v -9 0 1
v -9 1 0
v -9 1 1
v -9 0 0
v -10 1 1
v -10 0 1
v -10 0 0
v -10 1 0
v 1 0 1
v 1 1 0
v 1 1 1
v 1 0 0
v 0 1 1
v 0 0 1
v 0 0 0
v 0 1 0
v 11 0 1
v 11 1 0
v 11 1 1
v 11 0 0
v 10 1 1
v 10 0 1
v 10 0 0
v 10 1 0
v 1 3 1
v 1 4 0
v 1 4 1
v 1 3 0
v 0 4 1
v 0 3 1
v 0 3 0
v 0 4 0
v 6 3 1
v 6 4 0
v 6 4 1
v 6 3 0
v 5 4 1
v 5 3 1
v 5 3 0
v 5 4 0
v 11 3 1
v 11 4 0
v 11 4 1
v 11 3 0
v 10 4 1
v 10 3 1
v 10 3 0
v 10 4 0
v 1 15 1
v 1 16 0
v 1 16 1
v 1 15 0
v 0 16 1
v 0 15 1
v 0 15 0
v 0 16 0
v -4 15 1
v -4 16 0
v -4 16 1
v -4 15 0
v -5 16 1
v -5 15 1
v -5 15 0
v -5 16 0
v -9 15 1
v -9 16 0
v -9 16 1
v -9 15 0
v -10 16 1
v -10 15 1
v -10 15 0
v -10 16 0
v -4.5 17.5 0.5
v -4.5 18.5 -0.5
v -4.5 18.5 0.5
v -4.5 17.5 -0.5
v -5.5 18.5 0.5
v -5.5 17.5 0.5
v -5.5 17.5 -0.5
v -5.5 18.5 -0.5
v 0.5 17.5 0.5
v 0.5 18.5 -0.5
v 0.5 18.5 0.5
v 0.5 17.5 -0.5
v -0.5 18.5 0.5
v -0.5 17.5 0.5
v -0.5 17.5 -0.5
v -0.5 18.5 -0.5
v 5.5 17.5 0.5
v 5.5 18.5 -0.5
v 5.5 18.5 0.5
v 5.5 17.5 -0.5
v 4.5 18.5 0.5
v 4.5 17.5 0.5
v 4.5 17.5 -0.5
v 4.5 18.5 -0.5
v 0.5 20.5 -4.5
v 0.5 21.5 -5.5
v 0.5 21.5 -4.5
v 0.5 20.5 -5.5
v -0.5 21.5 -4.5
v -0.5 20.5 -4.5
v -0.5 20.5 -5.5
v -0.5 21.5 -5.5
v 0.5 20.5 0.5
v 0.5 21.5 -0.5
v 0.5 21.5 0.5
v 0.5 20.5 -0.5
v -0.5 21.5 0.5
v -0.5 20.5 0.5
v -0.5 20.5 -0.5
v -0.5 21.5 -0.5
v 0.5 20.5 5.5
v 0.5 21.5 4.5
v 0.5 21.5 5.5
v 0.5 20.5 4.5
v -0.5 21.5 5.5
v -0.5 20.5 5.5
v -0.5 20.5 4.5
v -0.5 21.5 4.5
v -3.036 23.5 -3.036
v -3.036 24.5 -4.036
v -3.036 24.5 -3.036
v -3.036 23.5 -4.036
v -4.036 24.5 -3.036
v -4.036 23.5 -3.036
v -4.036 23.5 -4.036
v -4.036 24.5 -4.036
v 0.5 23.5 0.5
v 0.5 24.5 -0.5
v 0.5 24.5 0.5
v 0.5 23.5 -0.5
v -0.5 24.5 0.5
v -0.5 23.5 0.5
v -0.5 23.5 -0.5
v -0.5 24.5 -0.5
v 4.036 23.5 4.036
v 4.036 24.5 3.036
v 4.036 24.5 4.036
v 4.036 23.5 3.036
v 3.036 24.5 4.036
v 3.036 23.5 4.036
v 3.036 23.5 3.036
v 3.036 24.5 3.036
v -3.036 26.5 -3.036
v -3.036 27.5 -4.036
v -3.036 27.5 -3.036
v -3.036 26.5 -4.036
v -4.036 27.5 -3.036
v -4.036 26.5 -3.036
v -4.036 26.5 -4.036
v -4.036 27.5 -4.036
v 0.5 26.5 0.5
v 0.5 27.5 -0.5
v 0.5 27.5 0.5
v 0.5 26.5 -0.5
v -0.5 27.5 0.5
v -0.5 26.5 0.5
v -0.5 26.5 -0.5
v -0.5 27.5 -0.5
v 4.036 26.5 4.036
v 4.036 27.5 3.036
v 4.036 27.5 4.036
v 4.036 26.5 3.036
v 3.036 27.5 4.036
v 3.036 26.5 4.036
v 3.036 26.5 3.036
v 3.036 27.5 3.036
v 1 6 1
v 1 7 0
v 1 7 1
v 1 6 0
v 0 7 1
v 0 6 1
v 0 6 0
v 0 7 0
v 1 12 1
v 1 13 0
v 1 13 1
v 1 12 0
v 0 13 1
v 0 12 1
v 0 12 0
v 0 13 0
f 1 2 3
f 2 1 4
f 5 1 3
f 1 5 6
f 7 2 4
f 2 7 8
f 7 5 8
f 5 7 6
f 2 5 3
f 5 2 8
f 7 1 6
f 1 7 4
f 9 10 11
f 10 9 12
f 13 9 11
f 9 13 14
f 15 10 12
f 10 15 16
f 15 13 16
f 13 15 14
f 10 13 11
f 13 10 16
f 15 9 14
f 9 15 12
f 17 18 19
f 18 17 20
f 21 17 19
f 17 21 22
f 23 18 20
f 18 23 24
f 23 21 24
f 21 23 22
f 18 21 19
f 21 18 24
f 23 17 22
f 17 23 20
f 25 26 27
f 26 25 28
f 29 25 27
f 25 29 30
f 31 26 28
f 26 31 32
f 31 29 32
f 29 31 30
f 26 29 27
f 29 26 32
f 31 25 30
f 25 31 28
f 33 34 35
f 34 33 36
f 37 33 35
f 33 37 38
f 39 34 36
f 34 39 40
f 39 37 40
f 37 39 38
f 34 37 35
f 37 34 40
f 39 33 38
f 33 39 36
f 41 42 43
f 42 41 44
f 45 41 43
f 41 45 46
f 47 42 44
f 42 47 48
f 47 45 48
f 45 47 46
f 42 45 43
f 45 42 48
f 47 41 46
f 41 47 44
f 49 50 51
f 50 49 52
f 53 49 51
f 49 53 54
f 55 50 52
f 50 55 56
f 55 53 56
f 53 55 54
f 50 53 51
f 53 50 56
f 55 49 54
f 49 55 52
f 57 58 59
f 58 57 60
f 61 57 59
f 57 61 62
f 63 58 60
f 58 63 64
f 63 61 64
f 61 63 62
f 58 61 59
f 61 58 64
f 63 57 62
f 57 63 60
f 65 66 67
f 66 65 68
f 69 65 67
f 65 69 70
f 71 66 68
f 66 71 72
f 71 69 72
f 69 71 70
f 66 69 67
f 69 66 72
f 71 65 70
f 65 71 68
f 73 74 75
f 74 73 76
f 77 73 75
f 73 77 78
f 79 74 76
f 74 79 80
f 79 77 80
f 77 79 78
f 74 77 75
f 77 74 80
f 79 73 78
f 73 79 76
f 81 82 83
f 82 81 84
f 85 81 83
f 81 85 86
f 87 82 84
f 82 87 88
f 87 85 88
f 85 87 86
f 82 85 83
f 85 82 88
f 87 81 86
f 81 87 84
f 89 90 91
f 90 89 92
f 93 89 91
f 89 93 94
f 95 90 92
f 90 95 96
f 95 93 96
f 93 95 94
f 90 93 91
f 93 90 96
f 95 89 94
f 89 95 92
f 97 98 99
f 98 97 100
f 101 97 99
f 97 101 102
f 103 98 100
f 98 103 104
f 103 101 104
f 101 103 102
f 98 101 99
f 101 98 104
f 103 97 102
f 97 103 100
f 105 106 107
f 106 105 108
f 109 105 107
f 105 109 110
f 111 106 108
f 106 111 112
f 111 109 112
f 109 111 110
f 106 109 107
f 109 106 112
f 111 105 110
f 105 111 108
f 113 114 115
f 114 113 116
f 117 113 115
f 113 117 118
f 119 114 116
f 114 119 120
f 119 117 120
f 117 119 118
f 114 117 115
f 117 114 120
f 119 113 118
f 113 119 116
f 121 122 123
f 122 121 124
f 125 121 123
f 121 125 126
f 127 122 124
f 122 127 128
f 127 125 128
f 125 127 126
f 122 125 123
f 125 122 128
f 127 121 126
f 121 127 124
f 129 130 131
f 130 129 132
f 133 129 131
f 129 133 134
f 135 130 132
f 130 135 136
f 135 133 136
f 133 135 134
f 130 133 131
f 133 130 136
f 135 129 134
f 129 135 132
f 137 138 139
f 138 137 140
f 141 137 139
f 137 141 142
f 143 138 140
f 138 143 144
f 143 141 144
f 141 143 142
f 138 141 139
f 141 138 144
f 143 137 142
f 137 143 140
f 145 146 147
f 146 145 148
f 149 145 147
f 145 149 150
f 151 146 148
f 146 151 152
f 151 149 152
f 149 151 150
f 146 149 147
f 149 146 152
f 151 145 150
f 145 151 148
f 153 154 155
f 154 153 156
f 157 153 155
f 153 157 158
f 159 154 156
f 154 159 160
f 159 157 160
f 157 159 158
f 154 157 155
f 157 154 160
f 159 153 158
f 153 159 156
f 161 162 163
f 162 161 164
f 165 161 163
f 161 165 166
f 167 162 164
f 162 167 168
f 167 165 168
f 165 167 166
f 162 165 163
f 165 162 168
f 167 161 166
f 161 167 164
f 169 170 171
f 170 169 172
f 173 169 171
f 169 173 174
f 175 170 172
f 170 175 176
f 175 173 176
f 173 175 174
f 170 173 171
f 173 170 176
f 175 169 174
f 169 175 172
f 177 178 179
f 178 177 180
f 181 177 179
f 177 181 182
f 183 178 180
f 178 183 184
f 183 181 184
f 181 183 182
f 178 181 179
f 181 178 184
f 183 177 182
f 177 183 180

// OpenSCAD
// file: unit_vectors.scad
// Define standard vector directions
// i, j, k
i = [1,0,0];
j = [0,1,0];
k = [0,0,1];
// zero vector
O = [0,0,0];
// file: extended_tests.scad
// Openscad extended test functions and modules
// Copyright (C) 2020  rjhwelsh

// This library is free software; you can redistribute it and/or
// modify it under the terms of the GNU Lesser General Public
// License as published by the Free Software Foundation; either
// version 2.1 of the License, or (at your option) any later version.
//
// This library is distributed in the hope that it will be useful,
// but WITHOUT ANY WARRANTY; without even the implied warranty of
// MERCHANTABILITY or FITNESS FOR A PARTICULAR PURPOSE.  See the GNU
// Lesser General Public License for more details.
//
// You should have received a copy of the GNU Lesser General Public
// License along with this library; if not, write to the Free Software
// Foundation, Inc., 51 Franklin Street, Fifth Floor, Boston, MA  02110-1301  USA

// assert_equal; Test first and second are equal
module assert_equal(first, second, msg) {
     msg = msg ? msg : str(first, " is not equal to ", second);
     assert(first==second, msg);
}
// file: extended_shapes.scad
// Openscad extended shapes
// Copyright (C) 2020  rjhwelsh

// This library is free software; you can redistribute it and/or
// modify it under the terms of the GNU Lesser General Public
// License as published by the Free Software Foundation; either
// version 2.1 of the License, or (at your option) any later version.
//
// This library is distributed in the hope that it will be useful,
// but WITHOUT ANY WARRANTY; without even the implied warranty of
// MERCHANTABILITY or FITNESS FOR A PARTICULAR PURPOSE.  See the GNU
// Lesser General Public License for more details.
//
// You should have received a copy of the GNU Lesser General Public
// License along with this library; if not, write to the Free Software
// Foundation, Inc., 51 Franklin Street, Fifth Floor, Boston, MA  02110-1301  USA

include <unit_vectors.scad>;

module array(
     L=false,              // total Length between centers
     n=3,               // number of items
     dx=false,          // distance between centres
     center=true,       // center array
     v=i                // unit vector direction
     )
     let( v=v/norm(v)) // convert to unit vector
{
     msg1="Please specify a single option of \"L\" or \"dx\"!";
     if(L) assert(!dx, msg1);
     if(dx) assert(!L, msg1);

     if (n>1) {
	  let(
	       dx=(L ? L/(n-1) : dx),
	       L=(dx ? dx*(n-1) : L)
	       )
	       for(x=[1:n])
		    translate(center ? -L/2*v : O) // Centre in axis
			 translate(dx*(x-1)*v)
			 children();
     }
     else if(n==1||n==-1) {
	  children();
     }
     else if(n<-1) {
	  let(n=-n) // positive the negative n
	       let(dx=(L ? L/(n-1) : dx),
		   L=(dx ? dx*(n-1) : L))
	       for(x=[1:n])
		    translate(center ? L/2*v : O) // Centre in axis
			 translate(-dx*(x-1)*v)
			 children();
     }
}

module fillet_cube(size=[1,1,1], r=0.3, center=false) {
     // rounds cornes in xy dimension only
     // size = outer dimensions of cube
     // r = fillet radius
     let( r_max = min(size[0], size[1])/2)
	  assert(r <= r_max, str("Radius does not fit within size! r_max=", r_max));
     recenter=(center ? 0 : 0.5);
     translate(recenter*[size[0],size[1],0])
	  hull()
	  let ( m = [size[0]/2 - r, size[1]/2 - r, 0] ) {
	  for(i = [-1:2:1])
	       for(j = [-1:2:1])
		    translate([i*m[0], j*m[1], m[2]])
			 cylinder(h=size[2],r=r,$fn=$fn);
     }
}

module fillet_trapezoid(size=i+j+k, r=0.3, angle=45, center=true) {
     // size = [xyz] outer dimensions to fit trapezoid in
     // r = fillet radius
     // angle = angle between base and sides
     // center = true/false; whether to position in center (or not)

     module tri(b, h) {
	  translate(h*j) children();
	  translate(b*i) children();
	  //children();
     }

     let( r_max = min(size[0], size[1])/2)
	  assert(r <= r_max, str("Radius does not fit within size! r_max=", r_max));
     let (s_r = [size[0]/2 - r, size[1]/2 - r, 0],
	  dx_max = s_r[0],
	  dh_max = dx_max*tan(angle),
	  dh = 2*s_r[1],
	  dx = dh/tan(angle),
	  assert_message = str(
	       "fillet_trapezoid: Reduce height. Maximum height (size[1]) is ", dh_max + 2*r, "!"),
	  // tr_x = max(size[0], size[0]-2*dx) // Translation for non-central placement
	  tr_x = size[0] // Translates according to width of base, (size[0])
	  ) {
	  //echo(str([dx, dx_max],[dh, dh_max]));
	  assert(dx <= dx_max, assert_message);
	  offset_center=(center ? 0 : 0.5);
	  translate(offset_center*[tr_x,dh+2*r,0])
	       hull()
	       translate(-j*dh/2) // Center in depth
	       for(a = [0:1]) // Mirror on other side
		    mirror(i*a)
			 translate(i*s_r[0]) // Adjust to width (size[0])
			 translate(-i*dx) // Move edge to center
			 tri(b=dx,h=dh)
			 cylinder(h=size[2], r=r);
     }
}

module round_cube(size=[1,1,1], r=0.3, center=false) {
     // rounds all corners in xyz
     // size = outer dimensions of cube
     // r = fillet radius
     let( r_max = min(size[0], size[1], size[2])/2)
	  assert(r <= r_max, str("Radius does not fit within size! r_max=", r_max));
     recenter=(center ? 0 : 0.5);
     translate(recenter*size)
	  hull()
	  let ( m = [size[0]/2 - r, size[1]/2 - r, size[2]/2 - r] ) {
	  for(i = [-1:2:1])
	       for(j = [-1:2:1])
		    for(k = [-1:2:1])
			 translate([i*m[0], j*m[1], k*m[2]])
			      sphere(r=r, $fn=$fn);
     }
}

module rotate_extrude_hull(
     angle=360,
     convexity=2,
     create_hull=true // Use hull unless working with concave shapes
     ) {
     total_angle=angle;
     module section_nohull(angle) {
	  rotate_extrude(angle=$fa)
	       projection(cut=true)
	       translate([0,0,1]*(-angle))
	       children();
     }

     module section_hull(angle, $fs=0.01) {
	  module cut(fa=0, fs=$fs) {
	       let (
		    trans = (angle+fa),
		    trans2 = (trans >= total_angle ? total_angle : trans))
		    rotate(a=fa, v=[0,1,0])
		    linear_extrude(height=fs/2)
		    projection(cut=true)
		    translate(-trans2*[0,0,1])
		    children();
	  }

	  rotate(a=90, v=[1,0,0])
	       hull() {
	       cut(fa=0) children();
	       cut(fa=$fa) children();
	  }
     }

     module main(total_angle=angle, create_hull=create_hull) {
	  let(
	       n = round(total_angle / $fa),
	       $fa = total_angle / n
	       )
	       if (create_hull) {
		    for (i=[0:$fa:total_angle-$fa])
			 let (angle=i)
			      rotate(a=angle, v=[0,0,1])
			      section_hull(angle=angle)
			      children();
	       }
	       else {
		    for (i=[0:$fa:total_angle-$fa])
			 let (angle=i)
			      rotate(a=angle, v=[0,0,1])
			      section_nohull(angle=angle)
			      children();
	       }
     }
     union() main() children();
}
// main file
// Test extended shapes

include <extended_shapes.scad>;
use <extended_tests.scad>

module test_array() {
     // Test array() module
     dx=3;


     // test dx override
     let(c=0)
	  color("cyan")
	  array(dx=10, n=3, center=true)
	  translate(j*dx*c)
	  cube(1, center=false);

     // test length array
     let(c=1)
	  color("red")
	  array(10, n=3, center=false)
	  translate(j*dx*c)
	  cube(1);

     // test positive 1
     let(c=2)
	  color("blue")
	  array(10, n=1, center=false)
	  translate(j*dx*c)
	  cube(1);

     // test zero = zero
     let(c=3)
	  color("cyan")
	  array(10, n=0, center=false)
	  translate(j*dx*c)
	  cube(1);

     // test negative 1
     let(c=4)
	  color("green")
	  array(10, n=-1, center=false)
	  translate(j*dx*c)
	  cube(1);

     // test negative n
     let(c=5)
	  color("yellow")
	  array(10, n=-3, center=false)
	  translate(j*dx*c)
	  cube(1);

     // test center=true
     let(c=6)
	  color("cyan")
	  array(10, n=3, center=true)
	  translate(j*dx*c)
	  cube(1, center=true);

     // test vector direction
     let(c=7)
	  color("red")
	  array(10, n=3, center=true, v=k)
	  translate(j*dx*c)
	  cube(1, center=true);

     // test angles
     let(c=8)
	  color("yellow")
	  array(10, n=3, center=true, v=(i+k))
	  translate(j*dx*c)
	  cube(1, center=true);

     // test conversion to unit vector (same length as previous)
     let(c=9)
	  color("orange")
	  array(10, n=3, center=true, v=100*(i+k))
	  translate(j*dx*c)
	  cube(1, center=true);

     // Test assert fails (enable to test crash)
     *let(c=0)
	  color("cyan")
	  array(10, dx=10, n=3, center=true)
	  translate(j*dx*c)
	  cube(1, center=true);

}

test_array();
